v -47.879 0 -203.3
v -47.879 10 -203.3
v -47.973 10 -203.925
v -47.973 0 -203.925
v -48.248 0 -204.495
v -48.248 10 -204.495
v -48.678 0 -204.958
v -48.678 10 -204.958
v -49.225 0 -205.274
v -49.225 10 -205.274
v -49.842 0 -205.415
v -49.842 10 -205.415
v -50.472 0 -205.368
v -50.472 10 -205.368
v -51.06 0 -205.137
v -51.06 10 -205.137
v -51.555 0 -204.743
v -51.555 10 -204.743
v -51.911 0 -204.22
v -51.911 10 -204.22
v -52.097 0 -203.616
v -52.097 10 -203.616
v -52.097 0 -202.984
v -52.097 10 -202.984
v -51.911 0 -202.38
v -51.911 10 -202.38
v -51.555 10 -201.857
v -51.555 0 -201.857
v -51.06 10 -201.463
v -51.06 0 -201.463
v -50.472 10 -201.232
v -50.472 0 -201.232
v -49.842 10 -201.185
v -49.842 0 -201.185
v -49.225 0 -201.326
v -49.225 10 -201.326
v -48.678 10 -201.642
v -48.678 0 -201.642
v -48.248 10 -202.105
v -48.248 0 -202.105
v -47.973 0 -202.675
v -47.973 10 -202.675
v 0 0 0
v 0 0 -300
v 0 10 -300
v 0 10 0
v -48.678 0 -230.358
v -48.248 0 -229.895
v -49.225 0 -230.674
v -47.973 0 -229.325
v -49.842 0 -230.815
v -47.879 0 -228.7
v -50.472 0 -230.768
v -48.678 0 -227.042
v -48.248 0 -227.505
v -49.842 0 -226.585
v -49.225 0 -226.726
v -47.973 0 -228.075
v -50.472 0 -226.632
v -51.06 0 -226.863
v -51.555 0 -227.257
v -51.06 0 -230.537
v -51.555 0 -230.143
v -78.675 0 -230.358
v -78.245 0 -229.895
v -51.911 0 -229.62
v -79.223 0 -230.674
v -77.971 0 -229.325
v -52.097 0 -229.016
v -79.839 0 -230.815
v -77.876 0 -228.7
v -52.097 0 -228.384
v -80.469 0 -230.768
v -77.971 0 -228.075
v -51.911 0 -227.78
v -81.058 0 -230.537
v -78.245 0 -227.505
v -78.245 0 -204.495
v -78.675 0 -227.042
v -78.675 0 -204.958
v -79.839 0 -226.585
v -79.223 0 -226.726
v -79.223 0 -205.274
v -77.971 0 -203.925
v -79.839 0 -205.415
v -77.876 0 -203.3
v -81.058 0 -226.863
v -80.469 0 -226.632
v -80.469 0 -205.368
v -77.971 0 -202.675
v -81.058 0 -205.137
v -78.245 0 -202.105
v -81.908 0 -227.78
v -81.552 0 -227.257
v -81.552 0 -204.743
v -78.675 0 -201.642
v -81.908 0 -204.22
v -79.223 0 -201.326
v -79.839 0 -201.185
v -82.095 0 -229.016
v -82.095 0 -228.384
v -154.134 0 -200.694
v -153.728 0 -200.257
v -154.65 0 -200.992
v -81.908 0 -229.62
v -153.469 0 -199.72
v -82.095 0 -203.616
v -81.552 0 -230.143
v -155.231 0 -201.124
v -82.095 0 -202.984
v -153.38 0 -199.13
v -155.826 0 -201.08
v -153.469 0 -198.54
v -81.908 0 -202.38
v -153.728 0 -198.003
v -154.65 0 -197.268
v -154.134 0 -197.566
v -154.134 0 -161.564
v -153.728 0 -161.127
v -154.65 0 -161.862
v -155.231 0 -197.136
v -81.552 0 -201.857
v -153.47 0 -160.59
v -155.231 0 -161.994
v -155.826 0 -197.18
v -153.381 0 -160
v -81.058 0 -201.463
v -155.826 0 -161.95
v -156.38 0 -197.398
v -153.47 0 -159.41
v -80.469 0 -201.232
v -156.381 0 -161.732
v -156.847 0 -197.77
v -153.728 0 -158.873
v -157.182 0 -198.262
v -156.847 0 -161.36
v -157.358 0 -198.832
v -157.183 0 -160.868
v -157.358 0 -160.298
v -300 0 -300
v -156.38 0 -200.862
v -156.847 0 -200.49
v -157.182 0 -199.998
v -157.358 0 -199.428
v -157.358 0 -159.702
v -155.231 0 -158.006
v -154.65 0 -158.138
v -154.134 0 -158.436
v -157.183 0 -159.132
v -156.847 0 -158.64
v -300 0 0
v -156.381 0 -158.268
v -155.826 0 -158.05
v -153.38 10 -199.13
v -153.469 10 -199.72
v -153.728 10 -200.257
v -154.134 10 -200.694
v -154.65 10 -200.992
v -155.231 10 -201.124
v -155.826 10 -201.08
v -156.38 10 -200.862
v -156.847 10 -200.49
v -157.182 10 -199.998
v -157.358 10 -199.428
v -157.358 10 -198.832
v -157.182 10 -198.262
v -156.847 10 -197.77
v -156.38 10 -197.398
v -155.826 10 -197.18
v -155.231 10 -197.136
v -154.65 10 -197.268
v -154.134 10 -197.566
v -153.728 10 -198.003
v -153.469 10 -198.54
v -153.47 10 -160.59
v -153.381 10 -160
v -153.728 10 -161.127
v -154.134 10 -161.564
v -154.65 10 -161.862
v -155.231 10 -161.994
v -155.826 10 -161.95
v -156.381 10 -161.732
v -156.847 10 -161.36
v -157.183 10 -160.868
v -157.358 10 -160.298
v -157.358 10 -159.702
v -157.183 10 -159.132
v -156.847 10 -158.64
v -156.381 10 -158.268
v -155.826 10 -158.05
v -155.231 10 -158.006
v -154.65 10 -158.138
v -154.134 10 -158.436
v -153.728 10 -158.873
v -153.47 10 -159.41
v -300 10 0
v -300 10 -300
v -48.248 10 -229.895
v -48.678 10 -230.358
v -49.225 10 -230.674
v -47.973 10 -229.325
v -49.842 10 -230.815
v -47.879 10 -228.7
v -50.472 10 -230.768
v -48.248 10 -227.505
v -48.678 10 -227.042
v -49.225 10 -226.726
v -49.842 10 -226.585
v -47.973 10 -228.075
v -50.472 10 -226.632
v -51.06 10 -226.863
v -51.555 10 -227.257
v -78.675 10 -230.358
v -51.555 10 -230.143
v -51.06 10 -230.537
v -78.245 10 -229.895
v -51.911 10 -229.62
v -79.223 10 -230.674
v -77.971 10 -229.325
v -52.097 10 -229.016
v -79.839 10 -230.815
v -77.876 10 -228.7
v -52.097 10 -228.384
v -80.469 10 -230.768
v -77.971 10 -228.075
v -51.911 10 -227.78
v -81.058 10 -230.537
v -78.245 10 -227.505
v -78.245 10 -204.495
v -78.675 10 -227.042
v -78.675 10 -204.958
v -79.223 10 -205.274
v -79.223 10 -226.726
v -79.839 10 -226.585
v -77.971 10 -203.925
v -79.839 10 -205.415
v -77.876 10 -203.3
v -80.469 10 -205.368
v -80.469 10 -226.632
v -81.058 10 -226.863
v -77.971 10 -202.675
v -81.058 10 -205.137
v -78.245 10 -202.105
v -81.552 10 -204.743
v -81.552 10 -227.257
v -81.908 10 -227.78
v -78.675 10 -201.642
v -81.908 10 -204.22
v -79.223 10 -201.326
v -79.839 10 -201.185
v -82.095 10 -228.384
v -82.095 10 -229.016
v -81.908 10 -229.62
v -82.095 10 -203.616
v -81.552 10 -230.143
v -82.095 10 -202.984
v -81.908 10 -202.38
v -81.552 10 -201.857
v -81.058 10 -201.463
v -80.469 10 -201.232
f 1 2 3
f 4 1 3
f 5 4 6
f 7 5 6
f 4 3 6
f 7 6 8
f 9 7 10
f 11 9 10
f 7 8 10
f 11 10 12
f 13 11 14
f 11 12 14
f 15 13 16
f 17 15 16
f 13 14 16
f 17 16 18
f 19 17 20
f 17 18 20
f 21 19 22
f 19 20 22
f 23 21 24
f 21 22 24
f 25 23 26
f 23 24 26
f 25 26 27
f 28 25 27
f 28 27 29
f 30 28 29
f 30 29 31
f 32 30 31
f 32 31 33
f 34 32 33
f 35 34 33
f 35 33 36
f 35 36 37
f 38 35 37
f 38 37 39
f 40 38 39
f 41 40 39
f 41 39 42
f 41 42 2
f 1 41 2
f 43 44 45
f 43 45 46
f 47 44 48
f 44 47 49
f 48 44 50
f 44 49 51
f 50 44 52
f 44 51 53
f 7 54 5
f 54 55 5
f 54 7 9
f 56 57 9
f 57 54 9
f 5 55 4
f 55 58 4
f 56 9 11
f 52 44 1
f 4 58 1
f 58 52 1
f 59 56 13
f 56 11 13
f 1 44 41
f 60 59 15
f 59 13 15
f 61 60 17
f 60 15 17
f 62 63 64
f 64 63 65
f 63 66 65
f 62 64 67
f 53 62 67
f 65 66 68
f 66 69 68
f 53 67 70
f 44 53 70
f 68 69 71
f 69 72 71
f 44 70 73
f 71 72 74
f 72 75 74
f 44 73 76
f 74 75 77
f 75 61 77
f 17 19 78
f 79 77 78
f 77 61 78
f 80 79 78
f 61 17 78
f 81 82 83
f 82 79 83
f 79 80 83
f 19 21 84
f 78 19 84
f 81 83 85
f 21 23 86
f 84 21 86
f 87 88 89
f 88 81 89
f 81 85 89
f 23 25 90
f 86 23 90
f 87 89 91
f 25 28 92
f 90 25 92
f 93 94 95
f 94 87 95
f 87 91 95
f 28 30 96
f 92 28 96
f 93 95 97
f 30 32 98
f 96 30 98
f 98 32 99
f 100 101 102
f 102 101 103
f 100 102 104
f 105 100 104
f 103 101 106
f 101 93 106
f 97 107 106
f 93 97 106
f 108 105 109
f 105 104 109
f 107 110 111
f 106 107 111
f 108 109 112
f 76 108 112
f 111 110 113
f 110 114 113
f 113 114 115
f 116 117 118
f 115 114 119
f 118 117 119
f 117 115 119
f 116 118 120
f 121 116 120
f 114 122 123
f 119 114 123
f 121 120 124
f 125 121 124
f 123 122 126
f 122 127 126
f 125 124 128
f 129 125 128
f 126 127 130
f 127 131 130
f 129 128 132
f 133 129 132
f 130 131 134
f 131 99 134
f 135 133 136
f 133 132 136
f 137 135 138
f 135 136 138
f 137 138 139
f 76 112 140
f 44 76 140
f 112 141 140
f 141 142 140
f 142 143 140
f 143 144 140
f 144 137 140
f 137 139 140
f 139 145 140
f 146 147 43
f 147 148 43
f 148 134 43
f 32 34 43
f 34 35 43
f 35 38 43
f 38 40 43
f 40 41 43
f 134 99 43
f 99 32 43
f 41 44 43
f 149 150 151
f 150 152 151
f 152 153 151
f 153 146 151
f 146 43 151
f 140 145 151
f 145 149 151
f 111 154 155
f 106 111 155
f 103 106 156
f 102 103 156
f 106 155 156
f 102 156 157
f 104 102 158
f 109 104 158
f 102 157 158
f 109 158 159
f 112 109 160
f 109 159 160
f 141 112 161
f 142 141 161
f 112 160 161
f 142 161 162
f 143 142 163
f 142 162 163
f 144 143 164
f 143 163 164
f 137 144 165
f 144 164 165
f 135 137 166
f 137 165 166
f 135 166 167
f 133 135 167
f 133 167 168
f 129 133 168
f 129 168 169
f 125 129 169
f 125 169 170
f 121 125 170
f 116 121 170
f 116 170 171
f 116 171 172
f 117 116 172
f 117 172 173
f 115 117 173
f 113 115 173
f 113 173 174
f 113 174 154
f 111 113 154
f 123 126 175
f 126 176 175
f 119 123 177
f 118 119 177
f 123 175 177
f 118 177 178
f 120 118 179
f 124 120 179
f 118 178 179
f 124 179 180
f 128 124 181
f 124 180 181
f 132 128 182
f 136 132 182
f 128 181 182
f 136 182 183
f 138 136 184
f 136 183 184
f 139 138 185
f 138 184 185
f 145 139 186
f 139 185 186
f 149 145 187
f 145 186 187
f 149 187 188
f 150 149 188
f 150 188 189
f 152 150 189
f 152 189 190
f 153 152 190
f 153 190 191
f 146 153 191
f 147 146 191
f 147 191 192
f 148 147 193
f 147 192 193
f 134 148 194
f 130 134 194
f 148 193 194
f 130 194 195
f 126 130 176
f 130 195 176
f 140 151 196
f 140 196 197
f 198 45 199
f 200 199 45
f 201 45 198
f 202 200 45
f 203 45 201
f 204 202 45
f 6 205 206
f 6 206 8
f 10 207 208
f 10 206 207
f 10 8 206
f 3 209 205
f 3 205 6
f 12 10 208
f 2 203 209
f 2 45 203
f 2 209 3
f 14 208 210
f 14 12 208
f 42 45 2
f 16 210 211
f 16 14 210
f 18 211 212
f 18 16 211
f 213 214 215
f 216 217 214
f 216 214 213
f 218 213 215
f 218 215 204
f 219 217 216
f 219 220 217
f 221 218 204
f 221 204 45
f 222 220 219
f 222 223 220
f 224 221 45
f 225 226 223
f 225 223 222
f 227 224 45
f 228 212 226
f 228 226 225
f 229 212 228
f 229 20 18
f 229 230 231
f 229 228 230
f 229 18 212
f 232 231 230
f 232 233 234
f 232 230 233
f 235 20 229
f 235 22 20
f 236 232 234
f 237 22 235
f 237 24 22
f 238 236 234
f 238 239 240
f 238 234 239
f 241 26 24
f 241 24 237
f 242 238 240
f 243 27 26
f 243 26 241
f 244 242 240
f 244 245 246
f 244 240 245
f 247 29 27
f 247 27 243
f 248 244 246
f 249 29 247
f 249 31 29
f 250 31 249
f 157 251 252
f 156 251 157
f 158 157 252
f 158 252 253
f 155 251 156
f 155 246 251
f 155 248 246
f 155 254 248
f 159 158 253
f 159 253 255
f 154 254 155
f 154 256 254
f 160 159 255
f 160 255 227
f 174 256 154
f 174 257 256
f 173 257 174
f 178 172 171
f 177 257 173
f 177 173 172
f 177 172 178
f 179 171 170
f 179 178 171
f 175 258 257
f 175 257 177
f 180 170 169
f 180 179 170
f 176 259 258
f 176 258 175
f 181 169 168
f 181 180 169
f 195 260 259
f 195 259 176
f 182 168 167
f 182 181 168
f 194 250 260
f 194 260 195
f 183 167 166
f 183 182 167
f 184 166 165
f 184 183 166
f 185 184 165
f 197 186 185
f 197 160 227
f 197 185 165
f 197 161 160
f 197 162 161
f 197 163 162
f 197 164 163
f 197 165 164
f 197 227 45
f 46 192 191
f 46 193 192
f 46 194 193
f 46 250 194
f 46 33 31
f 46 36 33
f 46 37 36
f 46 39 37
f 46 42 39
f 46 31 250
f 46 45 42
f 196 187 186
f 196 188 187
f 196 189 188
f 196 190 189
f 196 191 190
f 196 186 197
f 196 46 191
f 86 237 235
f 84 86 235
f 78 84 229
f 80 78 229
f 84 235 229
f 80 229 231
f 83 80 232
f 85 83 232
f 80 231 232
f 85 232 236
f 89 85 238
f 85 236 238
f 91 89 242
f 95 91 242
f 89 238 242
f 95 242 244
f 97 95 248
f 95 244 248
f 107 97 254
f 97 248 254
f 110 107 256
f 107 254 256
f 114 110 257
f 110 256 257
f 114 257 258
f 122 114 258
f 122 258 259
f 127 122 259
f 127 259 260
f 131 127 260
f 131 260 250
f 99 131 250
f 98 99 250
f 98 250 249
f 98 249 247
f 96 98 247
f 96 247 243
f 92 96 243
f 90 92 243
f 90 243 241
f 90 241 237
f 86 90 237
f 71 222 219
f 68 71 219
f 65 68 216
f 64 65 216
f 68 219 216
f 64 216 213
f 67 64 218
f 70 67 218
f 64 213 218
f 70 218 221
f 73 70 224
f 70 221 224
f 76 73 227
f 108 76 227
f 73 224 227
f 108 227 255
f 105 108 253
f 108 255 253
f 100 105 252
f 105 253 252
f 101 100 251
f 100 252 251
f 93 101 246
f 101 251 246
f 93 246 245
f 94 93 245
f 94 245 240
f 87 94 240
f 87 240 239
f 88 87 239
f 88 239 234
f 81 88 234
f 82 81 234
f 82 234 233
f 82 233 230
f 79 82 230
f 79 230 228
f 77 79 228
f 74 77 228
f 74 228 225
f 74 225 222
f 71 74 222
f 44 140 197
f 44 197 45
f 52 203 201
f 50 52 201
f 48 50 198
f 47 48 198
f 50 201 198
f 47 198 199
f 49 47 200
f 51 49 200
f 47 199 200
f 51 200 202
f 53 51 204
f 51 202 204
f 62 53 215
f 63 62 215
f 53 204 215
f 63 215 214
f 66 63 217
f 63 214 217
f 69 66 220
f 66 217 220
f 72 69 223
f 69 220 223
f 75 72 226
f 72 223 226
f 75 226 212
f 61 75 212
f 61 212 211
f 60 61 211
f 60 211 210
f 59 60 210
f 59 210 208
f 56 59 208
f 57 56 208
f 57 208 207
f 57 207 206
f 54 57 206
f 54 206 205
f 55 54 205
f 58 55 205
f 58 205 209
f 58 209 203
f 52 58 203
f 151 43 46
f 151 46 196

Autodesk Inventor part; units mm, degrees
ref_plane "YZ Plane" through (0, 0, 0) normal (1, 0, 0) x (0, 1, 0)
ref_plane "XZ Plane" through (0, 0, 0) normal (0, 1, 0) x (-1, 0, 0)
ref_plane "XY Plane" through (0, 0, 0) normal (0, 0, 1) x (1, 0, 0)
sketch "Sketch1" plane through (0, 0, 0) normal (0, 1, 0) x (-1, 0, 0)
  line L0 (0, 0) -> (300, 0)
  line L1 (300, 0) -> (300, -300)
  line L2 (300, -300) -> (0, -300)
  line L3 (0, -300) -> (0, 0)
  dimension "d0" = 300
  dimension "d1" = 300
extrude "Extrusion1" add sketch "Sketch1" along normal blind 10
sketch "Sketch2" plane through (0, 10, 0) normal (0, 1, 0) x (1, 0, 0)
  line L0 (0, 0) -> (0, 300) projected
  line L1 (0, 150) -> (-50, 150)
  circle A0 centre (-50, 203.3) radius 2.1209
  circle A1 centre (-50, 228.7) radius 2.1209
  circle A2 centre (-79.9974, 203.3) radius 2.1209
  circle A3 centre (-79.9974, 228.7) radius 2.1209
  dimension "d4" = 50
  dimension "d7" = 4.2418
extrude "Extrusion2" cut sketch "Sketch2" against normal through all
sketch "Sketch3" plane through (0, 10, 0) normal (0, 1, 0) x (1, 0, 0)
  circle A0 centre (-79.9974, 203.3) radius 2.1209 projected
  circle A1 centre (-50, 203.3) radius 2.1209 projected
  line L0 (-79.9974, 203.3) -> (-50, 203.3)
  line L1 (-64.9987, 203.3) -> (-64.9987, 160)
  line L2 (-64.9987, 160) -> (-125.2267, 160)
  line L3 (-125.2267, 160) -> (-155.3807, 160)
  circle A2 centre (-155.3807, 160) radius 2
  circle A3 centre (-155.3805, 199.13) radius 2
  point P0 (0, 0)
  dimension "d12" = 43.3
  dimension "d13" = 60.228
  dimension "d14" = 30.154
  dimension "d15" = 4
extrude "Extrusion3" cut sketch "Sketch3" against normal through all contours A2 | A3
properties part number "Base"
